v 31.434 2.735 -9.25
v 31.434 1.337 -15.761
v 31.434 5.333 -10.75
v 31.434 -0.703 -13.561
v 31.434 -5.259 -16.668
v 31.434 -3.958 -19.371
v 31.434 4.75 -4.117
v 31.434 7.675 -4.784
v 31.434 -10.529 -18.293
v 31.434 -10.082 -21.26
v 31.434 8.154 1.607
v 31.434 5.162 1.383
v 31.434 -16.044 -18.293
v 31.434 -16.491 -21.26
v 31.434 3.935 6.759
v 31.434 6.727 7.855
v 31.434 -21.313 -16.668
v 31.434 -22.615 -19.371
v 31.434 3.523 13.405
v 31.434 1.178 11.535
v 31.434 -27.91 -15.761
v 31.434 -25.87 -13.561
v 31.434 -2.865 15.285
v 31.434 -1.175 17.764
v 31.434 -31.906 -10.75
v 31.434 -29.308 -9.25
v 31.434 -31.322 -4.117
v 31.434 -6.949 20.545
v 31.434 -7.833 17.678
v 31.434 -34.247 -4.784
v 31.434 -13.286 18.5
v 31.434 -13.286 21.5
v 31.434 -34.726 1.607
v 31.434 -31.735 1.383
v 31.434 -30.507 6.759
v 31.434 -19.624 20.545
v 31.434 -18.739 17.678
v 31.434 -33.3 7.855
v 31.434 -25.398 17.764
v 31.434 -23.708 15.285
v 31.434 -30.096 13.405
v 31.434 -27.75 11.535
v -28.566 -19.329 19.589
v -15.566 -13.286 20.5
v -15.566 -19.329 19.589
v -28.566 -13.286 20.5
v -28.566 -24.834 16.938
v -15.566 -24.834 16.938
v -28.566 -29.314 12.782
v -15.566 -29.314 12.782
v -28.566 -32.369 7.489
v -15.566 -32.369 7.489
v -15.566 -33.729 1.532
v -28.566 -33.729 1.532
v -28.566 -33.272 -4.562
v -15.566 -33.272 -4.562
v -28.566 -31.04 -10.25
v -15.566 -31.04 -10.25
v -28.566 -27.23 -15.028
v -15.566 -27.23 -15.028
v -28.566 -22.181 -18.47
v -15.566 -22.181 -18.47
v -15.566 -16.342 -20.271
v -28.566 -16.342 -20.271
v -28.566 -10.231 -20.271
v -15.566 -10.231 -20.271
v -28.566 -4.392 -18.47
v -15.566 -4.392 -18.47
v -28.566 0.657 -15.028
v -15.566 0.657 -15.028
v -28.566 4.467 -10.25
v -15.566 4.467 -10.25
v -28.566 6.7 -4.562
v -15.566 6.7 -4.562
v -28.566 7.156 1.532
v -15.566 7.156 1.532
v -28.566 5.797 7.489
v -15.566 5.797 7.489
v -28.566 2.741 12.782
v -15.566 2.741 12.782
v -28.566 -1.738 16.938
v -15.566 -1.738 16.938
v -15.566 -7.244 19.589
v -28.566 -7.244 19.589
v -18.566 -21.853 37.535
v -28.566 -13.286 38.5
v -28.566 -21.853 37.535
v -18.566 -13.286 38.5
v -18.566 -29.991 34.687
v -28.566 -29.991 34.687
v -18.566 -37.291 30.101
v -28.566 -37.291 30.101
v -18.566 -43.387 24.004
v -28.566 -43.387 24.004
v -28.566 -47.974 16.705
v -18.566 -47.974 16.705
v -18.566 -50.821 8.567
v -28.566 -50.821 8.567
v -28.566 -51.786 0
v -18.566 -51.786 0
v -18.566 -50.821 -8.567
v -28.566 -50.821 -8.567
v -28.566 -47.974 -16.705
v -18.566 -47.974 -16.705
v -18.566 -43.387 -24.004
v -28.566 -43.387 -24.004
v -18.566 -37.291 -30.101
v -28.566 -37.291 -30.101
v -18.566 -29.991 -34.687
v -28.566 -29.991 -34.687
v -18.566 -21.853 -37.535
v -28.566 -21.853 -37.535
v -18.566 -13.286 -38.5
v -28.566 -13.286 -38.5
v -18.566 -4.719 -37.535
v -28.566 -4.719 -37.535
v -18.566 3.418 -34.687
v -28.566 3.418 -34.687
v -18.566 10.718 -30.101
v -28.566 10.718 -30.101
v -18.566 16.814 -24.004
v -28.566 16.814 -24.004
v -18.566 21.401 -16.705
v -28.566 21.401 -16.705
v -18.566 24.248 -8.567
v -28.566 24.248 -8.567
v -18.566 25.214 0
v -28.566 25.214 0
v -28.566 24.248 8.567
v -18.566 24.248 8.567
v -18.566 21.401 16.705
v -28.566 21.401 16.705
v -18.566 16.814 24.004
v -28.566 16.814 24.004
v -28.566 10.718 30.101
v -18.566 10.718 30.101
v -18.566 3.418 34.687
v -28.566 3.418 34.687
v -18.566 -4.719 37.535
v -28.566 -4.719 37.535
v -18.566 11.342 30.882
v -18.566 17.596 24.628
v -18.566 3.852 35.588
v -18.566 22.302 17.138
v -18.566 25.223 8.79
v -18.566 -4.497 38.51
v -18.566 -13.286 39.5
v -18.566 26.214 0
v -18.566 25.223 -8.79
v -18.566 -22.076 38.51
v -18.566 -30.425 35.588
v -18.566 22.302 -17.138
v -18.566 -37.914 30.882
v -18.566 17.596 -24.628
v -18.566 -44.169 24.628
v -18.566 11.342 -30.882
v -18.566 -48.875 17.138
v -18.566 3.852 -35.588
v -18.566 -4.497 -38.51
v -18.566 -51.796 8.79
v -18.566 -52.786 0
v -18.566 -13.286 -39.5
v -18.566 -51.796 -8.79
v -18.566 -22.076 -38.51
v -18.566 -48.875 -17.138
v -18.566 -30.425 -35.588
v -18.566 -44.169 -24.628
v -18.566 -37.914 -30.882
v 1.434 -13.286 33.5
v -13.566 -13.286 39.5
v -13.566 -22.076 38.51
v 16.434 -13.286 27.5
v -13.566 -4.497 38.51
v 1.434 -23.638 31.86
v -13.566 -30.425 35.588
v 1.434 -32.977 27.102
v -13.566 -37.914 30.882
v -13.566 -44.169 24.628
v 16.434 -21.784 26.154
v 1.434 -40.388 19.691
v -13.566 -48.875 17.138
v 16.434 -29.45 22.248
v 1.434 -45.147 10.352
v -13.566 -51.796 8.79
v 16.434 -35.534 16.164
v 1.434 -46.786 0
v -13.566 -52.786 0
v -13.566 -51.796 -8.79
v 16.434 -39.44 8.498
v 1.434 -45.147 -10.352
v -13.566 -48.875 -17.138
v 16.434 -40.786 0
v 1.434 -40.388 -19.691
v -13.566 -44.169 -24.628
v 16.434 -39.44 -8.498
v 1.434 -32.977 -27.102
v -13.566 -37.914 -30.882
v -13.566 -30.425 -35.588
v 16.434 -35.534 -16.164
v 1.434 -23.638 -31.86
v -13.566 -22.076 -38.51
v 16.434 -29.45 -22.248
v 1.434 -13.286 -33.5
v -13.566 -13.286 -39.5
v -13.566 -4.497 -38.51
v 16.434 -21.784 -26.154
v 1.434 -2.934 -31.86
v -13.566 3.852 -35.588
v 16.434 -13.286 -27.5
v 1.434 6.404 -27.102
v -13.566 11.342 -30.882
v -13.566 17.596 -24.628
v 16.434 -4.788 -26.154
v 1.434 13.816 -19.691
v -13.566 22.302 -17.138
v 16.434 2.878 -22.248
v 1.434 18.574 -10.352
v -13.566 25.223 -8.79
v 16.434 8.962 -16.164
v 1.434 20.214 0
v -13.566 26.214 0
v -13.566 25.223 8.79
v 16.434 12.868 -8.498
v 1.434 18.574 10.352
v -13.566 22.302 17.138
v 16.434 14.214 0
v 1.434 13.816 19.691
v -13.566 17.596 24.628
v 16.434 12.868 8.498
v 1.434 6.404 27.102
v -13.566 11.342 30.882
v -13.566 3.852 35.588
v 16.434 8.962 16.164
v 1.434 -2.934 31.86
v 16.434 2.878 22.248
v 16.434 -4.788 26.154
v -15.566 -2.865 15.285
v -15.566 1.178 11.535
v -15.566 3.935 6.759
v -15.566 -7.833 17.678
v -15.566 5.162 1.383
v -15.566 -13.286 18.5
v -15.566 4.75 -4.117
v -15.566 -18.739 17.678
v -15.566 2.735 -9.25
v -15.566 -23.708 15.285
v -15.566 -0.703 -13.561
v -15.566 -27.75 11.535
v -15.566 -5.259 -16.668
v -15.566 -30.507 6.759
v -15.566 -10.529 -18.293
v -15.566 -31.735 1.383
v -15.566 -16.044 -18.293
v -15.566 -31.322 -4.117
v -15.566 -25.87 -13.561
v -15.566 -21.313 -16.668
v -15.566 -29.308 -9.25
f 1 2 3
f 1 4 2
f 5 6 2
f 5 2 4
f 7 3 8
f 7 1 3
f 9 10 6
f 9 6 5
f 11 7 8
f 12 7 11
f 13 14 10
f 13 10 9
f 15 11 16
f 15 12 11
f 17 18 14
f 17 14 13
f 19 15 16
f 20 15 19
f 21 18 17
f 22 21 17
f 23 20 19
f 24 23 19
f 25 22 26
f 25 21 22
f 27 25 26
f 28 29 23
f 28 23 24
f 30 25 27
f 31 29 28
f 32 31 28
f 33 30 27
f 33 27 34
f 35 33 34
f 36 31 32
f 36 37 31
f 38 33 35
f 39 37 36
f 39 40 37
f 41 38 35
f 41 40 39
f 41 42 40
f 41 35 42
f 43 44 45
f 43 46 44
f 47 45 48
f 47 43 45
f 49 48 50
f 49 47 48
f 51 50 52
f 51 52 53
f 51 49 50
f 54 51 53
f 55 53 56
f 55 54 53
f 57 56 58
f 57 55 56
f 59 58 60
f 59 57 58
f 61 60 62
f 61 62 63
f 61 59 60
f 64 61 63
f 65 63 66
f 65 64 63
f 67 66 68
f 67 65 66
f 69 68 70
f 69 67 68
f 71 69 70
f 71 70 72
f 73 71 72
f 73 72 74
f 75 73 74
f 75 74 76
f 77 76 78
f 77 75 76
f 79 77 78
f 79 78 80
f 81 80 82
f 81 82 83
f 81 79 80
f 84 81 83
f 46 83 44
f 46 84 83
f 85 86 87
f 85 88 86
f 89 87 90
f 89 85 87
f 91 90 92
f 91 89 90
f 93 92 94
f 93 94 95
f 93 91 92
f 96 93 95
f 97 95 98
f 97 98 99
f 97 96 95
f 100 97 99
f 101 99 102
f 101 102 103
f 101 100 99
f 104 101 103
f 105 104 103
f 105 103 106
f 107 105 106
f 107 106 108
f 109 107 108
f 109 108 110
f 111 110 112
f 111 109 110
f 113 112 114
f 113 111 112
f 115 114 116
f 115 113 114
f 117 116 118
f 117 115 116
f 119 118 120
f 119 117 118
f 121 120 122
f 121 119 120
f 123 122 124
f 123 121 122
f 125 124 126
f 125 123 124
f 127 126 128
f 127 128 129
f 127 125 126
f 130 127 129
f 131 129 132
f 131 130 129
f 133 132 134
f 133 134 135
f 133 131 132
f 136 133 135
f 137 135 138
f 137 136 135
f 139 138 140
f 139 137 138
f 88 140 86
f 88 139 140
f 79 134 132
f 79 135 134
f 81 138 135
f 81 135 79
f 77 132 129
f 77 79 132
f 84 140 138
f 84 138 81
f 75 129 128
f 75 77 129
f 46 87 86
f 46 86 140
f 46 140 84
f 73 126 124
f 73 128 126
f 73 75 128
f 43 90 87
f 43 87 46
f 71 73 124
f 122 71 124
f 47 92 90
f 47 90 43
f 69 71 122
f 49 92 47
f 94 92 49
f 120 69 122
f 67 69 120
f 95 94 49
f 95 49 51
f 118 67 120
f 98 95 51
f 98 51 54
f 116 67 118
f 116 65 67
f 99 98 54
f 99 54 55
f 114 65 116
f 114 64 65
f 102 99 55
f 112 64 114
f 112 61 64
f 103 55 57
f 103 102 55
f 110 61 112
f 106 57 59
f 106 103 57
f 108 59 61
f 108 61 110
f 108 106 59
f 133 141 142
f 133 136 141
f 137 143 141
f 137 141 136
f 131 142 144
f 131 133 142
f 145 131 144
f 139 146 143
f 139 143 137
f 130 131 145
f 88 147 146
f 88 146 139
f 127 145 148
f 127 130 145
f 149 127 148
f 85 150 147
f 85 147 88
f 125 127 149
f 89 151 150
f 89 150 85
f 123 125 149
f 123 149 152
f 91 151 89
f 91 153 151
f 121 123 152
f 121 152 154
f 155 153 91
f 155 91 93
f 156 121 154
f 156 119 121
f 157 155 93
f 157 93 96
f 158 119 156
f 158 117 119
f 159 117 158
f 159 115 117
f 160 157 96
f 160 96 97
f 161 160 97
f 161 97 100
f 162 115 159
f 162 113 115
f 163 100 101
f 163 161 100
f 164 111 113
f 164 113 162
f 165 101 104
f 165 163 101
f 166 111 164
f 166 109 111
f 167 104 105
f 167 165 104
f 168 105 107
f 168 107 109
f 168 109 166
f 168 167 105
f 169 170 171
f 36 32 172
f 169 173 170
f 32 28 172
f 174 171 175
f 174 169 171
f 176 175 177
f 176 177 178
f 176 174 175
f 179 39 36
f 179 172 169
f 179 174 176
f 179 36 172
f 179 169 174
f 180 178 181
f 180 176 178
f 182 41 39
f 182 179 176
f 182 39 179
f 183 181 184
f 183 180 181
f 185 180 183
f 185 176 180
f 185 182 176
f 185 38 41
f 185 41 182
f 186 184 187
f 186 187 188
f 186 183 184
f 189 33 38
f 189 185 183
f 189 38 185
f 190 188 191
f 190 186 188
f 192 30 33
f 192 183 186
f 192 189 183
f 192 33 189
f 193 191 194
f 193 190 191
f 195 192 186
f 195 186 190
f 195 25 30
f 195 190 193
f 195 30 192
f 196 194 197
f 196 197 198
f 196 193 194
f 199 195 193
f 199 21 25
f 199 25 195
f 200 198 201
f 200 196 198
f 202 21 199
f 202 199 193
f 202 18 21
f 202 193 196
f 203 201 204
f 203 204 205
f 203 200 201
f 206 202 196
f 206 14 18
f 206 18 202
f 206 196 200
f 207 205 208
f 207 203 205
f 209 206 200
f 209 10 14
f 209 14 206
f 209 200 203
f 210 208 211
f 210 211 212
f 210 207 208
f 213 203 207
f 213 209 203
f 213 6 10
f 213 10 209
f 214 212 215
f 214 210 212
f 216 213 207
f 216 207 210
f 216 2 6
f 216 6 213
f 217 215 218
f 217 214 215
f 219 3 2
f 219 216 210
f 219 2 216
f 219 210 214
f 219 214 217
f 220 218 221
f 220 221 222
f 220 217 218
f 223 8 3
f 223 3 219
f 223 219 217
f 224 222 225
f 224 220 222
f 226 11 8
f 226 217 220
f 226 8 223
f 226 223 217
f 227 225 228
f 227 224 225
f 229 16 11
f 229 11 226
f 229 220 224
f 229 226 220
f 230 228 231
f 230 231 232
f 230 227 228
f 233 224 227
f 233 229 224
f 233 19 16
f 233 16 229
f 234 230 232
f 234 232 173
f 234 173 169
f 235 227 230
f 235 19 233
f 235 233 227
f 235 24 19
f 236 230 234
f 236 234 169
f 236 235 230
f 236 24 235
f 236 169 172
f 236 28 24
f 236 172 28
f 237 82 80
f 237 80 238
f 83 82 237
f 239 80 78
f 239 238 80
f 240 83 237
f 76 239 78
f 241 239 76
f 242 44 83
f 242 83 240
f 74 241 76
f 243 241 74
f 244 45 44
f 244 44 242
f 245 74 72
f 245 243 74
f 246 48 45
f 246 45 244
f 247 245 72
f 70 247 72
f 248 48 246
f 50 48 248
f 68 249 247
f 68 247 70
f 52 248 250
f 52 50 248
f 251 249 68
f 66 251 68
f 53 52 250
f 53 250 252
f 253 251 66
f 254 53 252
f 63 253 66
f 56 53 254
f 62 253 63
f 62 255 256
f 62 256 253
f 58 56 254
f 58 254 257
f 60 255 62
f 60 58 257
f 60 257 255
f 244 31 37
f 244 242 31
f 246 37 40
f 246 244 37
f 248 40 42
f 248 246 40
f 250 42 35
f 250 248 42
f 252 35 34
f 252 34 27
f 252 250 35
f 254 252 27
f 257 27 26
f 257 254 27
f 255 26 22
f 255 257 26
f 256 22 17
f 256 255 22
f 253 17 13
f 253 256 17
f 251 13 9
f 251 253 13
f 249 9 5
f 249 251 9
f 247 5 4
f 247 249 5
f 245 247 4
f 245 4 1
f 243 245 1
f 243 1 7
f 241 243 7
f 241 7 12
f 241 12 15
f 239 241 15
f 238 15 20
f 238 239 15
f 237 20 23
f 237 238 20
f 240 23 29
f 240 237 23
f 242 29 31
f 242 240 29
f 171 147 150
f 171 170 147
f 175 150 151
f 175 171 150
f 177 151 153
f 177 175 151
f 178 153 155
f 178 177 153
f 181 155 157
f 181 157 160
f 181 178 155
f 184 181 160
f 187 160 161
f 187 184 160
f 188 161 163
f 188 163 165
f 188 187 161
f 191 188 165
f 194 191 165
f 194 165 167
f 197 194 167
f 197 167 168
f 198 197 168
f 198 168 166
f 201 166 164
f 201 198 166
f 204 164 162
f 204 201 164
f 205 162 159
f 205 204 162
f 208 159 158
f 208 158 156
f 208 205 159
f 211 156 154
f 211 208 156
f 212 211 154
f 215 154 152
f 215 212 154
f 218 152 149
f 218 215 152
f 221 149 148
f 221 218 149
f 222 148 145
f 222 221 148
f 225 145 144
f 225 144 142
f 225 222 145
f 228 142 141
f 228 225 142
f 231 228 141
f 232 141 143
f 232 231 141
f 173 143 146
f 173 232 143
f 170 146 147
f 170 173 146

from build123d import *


with BuildPart() as part:
    # Esquisse1 → Révolution1 (revolve)
    with BuildSketch(Plane.XY, mode=Mode.PRIVATE) as r_volution1_sk:
        Polygon((-28.565758671, 25.213681359), (-18.565758671, 25.213681359), (-18.565758671, 26.213681359), (-13.565758671, 26.213681359), (31.434241329, 8.213681359), (31.434241329, 5.213681359), (-15.565758671, 5.213681359), (-15.565758671, 7.213681359), (-28.565758671, 7.213681359), align=None)
    revolve(r_volution1_sk.sketch.rotate(Axis((-43.545779604, -13.286318641, 0), (1, 0, 0)), 90), axis=Axis((-43.545779604, -13.286318641, 0), (1, 0, 0)))  # turned: the seam where the file's is


solid = part.part
